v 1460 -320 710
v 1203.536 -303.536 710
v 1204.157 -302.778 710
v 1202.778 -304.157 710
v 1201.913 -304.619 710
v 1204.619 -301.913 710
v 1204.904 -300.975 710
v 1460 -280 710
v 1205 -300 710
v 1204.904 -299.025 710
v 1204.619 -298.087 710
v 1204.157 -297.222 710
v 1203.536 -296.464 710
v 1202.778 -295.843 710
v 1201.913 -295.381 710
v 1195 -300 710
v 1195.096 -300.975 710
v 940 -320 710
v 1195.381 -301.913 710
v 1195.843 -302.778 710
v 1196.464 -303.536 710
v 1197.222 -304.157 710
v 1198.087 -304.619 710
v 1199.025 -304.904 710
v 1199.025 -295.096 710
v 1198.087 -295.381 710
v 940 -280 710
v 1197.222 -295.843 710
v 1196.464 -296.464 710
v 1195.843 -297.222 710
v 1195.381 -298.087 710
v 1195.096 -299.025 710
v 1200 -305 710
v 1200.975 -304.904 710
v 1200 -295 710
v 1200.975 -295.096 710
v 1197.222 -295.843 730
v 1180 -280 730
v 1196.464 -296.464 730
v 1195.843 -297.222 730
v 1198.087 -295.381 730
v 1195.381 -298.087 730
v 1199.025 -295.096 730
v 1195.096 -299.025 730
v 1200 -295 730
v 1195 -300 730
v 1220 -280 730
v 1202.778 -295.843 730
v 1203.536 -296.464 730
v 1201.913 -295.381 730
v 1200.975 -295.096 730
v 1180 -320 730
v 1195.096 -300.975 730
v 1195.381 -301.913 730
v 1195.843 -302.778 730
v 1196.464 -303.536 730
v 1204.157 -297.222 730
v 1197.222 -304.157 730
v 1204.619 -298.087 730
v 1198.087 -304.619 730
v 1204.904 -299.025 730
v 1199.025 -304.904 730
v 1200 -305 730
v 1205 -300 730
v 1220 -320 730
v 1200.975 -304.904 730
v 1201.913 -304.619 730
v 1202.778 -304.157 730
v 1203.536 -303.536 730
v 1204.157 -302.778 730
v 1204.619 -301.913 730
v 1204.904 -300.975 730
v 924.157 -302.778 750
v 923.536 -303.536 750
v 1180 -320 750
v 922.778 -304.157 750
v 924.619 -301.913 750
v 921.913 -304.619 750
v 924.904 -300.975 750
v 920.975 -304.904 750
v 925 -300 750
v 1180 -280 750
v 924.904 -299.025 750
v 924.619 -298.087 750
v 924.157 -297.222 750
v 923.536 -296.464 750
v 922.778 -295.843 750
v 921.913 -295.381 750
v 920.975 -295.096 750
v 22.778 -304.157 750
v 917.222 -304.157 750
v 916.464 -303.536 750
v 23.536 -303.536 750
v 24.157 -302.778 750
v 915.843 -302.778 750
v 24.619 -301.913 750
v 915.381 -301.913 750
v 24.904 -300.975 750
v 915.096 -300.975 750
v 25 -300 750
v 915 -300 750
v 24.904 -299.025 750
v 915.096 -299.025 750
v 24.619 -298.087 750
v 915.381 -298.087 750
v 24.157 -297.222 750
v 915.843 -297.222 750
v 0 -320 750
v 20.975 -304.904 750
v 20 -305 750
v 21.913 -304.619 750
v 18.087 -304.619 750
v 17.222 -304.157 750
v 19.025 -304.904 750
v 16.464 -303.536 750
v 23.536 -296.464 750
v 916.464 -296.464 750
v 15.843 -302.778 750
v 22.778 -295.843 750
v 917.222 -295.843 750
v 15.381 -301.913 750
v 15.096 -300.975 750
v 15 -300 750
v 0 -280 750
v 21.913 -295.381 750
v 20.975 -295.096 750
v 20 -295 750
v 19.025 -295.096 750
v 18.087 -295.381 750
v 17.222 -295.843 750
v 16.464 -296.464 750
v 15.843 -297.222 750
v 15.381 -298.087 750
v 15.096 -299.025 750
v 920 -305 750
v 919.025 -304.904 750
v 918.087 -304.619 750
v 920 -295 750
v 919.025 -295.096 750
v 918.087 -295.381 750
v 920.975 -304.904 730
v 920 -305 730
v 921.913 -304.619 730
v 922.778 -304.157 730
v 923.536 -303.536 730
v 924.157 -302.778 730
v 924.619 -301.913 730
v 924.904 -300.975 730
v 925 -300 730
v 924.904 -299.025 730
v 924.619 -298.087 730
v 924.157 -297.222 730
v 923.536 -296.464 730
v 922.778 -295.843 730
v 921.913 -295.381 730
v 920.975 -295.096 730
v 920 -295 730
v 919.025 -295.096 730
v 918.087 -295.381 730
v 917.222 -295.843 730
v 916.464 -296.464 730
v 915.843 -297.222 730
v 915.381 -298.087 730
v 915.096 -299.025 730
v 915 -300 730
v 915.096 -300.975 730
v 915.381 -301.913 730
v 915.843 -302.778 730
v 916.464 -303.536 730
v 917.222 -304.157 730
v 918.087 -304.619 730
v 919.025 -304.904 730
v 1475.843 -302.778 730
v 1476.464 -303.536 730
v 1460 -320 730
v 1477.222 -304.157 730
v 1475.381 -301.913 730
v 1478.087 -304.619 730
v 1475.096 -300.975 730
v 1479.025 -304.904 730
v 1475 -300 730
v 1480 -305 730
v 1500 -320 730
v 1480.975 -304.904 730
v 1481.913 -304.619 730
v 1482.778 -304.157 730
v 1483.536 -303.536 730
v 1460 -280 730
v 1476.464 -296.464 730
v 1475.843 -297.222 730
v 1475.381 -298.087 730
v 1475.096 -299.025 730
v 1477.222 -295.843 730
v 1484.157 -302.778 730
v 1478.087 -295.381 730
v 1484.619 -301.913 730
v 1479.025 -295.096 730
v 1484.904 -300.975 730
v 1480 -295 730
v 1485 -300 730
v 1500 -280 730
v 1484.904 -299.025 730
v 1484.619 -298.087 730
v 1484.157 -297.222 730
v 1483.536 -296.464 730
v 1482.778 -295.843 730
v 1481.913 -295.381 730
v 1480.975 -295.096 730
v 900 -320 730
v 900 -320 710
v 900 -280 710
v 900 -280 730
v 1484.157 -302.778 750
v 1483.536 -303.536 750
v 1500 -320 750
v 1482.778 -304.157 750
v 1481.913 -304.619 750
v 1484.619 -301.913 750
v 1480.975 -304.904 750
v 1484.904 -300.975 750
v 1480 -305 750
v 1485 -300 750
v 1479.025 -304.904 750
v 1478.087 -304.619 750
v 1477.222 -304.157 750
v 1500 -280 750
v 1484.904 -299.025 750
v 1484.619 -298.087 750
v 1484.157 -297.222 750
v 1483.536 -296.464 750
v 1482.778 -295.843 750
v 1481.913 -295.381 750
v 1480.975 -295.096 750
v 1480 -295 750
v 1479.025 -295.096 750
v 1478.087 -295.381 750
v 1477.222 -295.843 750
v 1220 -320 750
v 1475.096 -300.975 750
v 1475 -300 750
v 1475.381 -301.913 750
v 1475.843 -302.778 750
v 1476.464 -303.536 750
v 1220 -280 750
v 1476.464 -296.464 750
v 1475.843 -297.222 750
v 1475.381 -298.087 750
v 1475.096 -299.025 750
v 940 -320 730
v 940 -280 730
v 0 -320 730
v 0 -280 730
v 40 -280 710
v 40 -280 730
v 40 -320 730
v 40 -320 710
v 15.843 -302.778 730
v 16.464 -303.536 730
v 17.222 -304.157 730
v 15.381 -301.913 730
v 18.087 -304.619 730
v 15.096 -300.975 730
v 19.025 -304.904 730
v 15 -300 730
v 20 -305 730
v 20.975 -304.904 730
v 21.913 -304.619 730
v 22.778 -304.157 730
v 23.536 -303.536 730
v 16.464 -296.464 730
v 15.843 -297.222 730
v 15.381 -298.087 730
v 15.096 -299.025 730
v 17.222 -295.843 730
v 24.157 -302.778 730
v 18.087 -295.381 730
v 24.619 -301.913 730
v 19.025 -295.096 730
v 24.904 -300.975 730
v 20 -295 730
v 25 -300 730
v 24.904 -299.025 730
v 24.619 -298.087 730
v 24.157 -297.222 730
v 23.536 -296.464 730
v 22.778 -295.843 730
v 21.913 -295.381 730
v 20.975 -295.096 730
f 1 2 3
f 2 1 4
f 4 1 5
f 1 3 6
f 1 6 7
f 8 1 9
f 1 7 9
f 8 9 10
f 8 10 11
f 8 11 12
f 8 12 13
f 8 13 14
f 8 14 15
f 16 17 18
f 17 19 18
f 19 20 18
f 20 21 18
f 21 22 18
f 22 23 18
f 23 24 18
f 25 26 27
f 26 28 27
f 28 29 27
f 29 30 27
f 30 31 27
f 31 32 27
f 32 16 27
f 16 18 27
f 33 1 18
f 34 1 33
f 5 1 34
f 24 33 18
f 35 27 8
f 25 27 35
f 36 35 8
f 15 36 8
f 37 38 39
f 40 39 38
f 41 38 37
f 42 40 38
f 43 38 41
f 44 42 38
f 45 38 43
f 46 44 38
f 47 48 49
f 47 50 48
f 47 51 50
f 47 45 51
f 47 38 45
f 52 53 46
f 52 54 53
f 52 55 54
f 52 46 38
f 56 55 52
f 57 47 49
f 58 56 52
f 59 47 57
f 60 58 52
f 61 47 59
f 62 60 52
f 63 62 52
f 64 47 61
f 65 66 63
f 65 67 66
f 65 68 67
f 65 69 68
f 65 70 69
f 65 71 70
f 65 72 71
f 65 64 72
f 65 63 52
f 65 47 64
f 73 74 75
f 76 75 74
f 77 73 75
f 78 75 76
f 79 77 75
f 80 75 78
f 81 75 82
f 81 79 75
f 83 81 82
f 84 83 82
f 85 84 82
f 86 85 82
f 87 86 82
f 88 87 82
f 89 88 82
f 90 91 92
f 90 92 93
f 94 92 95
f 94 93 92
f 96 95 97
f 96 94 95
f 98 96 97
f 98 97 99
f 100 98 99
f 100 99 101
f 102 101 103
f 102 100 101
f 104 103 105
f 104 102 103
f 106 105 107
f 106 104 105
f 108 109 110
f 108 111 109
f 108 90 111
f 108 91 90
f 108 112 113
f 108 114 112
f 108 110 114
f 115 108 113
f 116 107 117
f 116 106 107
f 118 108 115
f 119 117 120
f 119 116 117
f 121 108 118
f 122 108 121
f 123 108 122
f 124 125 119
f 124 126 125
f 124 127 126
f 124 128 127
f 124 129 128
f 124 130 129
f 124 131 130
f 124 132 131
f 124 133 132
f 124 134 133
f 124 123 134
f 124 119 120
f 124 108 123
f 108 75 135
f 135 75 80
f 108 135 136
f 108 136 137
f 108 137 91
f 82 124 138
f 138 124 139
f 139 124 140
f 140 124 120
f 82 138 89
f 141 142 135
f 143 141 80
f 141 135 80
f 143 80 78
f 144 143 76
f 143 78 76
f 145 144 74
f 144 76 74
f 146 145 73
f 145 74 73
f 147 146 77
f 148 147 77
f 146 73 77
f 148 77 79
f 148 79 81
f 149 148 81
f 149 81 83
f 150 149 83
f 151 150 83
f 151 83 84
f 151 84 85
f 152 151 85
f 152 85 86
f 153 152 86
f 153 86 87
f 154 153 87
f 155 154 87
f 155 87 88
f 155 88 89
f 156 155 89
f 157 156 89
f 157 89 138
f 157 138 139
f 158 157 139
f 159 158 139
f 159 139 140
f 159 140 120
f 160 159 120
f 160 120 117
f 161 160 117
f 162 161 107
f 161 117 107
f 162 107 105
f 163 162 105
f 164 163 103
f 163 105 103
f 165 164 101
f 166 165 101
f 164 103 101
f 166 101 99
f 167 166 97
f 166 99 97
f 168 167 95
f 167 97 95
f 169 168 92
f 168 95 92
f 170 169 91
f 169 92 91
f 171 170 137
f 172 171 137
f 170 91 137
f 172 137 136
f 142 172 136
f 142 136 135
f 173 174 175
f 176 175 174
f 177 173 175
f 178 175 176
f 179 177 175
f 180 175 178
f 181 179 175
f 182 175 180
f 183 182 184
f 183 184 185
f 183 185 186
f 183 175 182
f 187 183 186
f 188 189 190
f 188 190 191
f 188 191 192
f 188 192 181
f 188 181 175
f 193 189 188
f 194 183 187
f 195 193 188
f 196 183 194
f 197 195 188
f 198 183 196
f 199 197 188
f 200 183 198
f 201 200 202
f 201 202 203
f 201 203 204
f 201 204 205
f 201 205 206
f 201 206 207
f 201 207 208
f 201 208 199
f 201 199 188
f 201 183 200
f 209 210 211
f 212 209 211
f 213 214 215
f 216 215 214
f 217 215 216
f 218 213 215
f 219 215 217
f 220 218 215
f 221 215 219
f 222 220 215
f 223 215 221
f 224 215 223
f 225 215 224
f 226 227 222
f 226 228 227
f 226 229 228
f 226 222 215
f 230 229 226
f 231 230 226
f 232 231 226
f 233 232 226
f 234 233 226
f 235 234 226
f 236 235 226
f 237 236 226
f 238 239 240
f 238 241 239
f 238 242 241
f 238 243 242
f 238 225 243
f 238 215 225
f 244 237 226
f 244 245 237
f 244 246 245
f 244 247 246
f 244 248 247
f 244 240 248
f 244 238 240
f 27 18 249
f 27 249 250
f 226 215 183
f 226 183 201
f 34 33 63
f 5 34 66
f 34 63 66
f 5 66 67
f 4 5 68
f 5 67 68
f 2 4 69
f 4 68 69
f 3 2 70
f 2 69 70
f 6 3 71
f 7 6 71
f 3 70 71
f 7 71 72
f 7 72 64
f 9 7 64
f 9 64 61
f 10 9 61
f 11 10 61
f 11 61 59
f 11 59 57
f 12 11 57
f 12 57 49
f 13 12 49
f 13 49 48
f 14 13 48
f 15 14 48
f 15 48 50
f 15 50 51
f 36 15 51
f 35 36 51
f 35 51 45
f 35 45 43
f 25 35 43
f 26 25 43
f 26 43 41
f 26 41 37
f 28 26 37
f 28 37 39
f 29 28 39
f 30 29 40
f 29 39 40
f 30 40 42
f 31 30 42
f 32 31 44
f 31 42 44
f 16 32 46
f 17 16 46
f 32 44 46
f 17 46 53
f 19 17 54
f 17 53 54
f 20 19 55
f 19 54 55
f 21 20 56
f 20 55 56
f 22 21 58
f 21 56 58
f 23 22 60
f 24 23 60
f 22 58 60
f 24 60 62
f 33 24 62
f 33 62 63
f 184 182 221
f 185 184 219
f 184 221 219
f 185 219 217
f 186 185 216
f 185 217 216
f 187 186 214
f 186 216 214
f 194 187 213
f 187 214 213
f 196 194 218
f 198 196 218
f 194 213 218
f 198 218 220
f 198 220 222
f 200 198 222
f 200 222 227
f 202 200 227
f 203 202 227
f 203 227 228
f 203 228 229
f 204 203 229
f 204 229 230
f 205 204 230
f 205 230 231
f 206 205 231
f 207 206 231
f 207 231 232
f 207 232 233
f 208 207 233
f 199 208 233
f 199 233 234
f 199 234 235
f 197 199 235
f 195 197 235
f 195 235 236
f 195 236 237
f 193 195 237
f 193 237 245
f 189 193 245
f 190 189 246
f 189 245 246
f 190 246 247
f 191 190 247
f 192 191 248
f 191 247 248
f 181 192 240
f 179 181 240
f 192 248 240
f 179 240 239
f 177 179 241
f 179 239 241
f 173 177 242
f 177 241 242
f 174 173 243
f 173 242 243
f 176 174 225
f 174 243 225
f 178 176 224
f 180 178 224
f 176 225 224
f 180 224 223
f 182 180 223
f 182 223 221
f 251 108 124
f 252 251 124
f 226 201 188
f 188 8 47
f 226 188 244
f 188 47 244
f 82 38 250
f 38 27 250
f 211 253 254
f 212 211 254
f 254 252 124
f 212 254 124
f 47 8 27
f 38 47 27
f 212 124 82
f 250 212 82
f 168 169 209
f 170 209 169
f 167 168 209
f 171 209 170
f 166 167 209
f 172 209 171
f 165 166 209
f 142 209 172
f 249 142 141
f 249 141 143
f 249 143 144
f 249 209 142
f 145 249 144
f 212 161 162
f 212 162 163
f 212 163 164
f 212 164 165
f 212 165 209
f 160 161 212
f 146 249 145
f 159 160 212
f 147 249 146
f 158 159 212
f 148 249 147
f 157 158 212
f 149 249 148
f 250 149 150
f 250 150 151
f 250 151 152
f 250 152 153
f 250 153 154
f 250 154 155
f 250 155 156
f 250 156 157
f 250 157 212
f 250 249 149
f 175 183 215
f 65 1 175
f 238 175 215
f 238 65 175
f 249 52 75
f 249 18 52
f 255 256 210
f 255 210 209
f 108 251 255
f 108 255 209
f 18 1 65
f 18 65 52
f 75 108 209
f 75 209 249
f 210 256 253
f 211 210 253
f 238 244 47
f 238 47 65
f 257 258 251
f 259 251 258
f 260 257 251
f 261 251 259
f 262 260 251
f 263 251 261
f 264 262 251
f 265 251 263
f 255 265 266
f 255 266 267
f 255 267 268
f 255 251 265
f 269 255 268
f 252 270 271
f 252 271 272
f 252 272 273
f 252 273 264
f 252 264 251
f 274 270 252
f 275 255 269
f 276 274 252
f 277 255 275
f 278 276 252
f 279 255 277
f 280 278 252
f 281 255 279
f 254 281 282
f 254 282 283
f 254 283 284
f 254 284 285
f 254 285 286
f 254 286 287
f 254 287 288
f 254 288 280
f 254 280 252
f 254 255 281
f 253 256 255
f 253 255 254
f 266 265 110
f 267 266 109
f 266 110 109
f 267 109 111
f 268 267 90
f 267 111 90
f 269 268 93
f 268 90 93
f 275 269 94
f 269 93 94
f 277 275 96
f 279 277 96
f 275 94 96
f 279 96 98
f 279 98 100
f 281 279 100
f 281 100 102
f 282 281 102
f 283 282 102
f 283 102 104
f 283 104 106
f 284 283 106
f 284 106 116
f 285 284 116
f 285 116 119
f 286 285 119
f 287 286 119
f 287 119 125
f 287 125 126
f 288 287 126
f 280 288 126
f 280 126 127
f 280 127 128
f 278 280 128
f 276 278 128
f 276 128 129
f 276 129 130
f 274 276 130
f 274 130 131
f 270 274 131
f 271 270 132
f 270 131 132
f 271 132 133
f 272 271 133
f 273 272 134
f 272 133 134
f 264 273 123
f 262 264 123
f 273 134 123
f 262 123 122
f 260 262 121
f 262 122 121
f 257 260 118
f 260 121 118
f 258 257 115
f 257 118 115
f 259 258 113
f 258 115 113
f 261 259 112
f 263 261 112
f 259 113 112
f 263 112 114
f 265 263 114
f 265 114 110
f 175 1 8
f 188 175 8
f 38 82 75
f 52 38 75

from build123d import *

# Parameters (mm, degrees)
SKETCH030_W     = 40
SKETCH030_H     = 40
PAD022_DEPTH    = 1500
SKETCH031_W     = 40
SKETCH031_H     = 40
POCKET008_DEPTH = 20
SKETCH032_W     = 40
SKETCH032_H     = 40
POCKET009_DEPTH = 20
SKETCH059_R     = 5
POCKET014_DEPTH = 40.001


with BuildPart() as part:
    # Sketch030 → Pad022 (new body)
    with BuildSketch(Plane.YZ):
        with Locations((-300, 280)):
            Rectangle(SKETCH030_W, SKETCH030_H)
    extrude(amount=PAD022_DEPTH)

    # Sketch031 (on Face3 of Pad022) → Pocket008 (cut)
    with BuildSketch(Plane.YX.offset(-260)):
        with Locations((-300, 1480)):
            Rectangle(SKETCH031_W, SKETCH031_H)
        with Locations((-300, 920)):
            Rectangle(SKETCH031_W, SKETCH031_H)
        with Locations((-300, 20)):
            Rectangle(SKETCH031_W, SKETCH031_H)
    extrude(amount=-POCKET008_DEPTH, mode=Mode.SUBTRACT)

    # Sketch032 (on Face1 of Pocket008) → Pocket009 (cut)
    with BuildSketch(Plane(origin=(0, 0, 300), x_dir=(0, -1, 0), z_dir=(0, 0, 1))):
        with Locations((300, 1200)):
            Rectangle(SKETCH032_W, SKETCH032_H)
    extrude(amount=-POCKET009_DEPTH, mode=Mode.SUBTRACT)

    # Sketch059 (on Face1 of Pocket009) → Pocket014 (cut, through all)
    with BuildSketch(Plane(origin=(0, 0, 300), x_dir=(0, -1, 0), z_dir=(0, 0, 1))):
        with Locations((300, 20)):
            Circle(SKETCH059_R)
        with Locations((300, 920)):
            Circle(SKETCH059_R)
        with Locations((300, 1480)):
            Circle(SKETCH059_R)
        with Locations((300, 1200)):
            Circle(SKETCH059_R)
    extrude(amount=-POCKET014_DEPTH, mode=Mode.SUBTRACT)


with BuildPart() as part_1:
    # Clone010 placement: moved
    add(part.part.moved(Location((0, 0, 450))))


solid = part_1.part
